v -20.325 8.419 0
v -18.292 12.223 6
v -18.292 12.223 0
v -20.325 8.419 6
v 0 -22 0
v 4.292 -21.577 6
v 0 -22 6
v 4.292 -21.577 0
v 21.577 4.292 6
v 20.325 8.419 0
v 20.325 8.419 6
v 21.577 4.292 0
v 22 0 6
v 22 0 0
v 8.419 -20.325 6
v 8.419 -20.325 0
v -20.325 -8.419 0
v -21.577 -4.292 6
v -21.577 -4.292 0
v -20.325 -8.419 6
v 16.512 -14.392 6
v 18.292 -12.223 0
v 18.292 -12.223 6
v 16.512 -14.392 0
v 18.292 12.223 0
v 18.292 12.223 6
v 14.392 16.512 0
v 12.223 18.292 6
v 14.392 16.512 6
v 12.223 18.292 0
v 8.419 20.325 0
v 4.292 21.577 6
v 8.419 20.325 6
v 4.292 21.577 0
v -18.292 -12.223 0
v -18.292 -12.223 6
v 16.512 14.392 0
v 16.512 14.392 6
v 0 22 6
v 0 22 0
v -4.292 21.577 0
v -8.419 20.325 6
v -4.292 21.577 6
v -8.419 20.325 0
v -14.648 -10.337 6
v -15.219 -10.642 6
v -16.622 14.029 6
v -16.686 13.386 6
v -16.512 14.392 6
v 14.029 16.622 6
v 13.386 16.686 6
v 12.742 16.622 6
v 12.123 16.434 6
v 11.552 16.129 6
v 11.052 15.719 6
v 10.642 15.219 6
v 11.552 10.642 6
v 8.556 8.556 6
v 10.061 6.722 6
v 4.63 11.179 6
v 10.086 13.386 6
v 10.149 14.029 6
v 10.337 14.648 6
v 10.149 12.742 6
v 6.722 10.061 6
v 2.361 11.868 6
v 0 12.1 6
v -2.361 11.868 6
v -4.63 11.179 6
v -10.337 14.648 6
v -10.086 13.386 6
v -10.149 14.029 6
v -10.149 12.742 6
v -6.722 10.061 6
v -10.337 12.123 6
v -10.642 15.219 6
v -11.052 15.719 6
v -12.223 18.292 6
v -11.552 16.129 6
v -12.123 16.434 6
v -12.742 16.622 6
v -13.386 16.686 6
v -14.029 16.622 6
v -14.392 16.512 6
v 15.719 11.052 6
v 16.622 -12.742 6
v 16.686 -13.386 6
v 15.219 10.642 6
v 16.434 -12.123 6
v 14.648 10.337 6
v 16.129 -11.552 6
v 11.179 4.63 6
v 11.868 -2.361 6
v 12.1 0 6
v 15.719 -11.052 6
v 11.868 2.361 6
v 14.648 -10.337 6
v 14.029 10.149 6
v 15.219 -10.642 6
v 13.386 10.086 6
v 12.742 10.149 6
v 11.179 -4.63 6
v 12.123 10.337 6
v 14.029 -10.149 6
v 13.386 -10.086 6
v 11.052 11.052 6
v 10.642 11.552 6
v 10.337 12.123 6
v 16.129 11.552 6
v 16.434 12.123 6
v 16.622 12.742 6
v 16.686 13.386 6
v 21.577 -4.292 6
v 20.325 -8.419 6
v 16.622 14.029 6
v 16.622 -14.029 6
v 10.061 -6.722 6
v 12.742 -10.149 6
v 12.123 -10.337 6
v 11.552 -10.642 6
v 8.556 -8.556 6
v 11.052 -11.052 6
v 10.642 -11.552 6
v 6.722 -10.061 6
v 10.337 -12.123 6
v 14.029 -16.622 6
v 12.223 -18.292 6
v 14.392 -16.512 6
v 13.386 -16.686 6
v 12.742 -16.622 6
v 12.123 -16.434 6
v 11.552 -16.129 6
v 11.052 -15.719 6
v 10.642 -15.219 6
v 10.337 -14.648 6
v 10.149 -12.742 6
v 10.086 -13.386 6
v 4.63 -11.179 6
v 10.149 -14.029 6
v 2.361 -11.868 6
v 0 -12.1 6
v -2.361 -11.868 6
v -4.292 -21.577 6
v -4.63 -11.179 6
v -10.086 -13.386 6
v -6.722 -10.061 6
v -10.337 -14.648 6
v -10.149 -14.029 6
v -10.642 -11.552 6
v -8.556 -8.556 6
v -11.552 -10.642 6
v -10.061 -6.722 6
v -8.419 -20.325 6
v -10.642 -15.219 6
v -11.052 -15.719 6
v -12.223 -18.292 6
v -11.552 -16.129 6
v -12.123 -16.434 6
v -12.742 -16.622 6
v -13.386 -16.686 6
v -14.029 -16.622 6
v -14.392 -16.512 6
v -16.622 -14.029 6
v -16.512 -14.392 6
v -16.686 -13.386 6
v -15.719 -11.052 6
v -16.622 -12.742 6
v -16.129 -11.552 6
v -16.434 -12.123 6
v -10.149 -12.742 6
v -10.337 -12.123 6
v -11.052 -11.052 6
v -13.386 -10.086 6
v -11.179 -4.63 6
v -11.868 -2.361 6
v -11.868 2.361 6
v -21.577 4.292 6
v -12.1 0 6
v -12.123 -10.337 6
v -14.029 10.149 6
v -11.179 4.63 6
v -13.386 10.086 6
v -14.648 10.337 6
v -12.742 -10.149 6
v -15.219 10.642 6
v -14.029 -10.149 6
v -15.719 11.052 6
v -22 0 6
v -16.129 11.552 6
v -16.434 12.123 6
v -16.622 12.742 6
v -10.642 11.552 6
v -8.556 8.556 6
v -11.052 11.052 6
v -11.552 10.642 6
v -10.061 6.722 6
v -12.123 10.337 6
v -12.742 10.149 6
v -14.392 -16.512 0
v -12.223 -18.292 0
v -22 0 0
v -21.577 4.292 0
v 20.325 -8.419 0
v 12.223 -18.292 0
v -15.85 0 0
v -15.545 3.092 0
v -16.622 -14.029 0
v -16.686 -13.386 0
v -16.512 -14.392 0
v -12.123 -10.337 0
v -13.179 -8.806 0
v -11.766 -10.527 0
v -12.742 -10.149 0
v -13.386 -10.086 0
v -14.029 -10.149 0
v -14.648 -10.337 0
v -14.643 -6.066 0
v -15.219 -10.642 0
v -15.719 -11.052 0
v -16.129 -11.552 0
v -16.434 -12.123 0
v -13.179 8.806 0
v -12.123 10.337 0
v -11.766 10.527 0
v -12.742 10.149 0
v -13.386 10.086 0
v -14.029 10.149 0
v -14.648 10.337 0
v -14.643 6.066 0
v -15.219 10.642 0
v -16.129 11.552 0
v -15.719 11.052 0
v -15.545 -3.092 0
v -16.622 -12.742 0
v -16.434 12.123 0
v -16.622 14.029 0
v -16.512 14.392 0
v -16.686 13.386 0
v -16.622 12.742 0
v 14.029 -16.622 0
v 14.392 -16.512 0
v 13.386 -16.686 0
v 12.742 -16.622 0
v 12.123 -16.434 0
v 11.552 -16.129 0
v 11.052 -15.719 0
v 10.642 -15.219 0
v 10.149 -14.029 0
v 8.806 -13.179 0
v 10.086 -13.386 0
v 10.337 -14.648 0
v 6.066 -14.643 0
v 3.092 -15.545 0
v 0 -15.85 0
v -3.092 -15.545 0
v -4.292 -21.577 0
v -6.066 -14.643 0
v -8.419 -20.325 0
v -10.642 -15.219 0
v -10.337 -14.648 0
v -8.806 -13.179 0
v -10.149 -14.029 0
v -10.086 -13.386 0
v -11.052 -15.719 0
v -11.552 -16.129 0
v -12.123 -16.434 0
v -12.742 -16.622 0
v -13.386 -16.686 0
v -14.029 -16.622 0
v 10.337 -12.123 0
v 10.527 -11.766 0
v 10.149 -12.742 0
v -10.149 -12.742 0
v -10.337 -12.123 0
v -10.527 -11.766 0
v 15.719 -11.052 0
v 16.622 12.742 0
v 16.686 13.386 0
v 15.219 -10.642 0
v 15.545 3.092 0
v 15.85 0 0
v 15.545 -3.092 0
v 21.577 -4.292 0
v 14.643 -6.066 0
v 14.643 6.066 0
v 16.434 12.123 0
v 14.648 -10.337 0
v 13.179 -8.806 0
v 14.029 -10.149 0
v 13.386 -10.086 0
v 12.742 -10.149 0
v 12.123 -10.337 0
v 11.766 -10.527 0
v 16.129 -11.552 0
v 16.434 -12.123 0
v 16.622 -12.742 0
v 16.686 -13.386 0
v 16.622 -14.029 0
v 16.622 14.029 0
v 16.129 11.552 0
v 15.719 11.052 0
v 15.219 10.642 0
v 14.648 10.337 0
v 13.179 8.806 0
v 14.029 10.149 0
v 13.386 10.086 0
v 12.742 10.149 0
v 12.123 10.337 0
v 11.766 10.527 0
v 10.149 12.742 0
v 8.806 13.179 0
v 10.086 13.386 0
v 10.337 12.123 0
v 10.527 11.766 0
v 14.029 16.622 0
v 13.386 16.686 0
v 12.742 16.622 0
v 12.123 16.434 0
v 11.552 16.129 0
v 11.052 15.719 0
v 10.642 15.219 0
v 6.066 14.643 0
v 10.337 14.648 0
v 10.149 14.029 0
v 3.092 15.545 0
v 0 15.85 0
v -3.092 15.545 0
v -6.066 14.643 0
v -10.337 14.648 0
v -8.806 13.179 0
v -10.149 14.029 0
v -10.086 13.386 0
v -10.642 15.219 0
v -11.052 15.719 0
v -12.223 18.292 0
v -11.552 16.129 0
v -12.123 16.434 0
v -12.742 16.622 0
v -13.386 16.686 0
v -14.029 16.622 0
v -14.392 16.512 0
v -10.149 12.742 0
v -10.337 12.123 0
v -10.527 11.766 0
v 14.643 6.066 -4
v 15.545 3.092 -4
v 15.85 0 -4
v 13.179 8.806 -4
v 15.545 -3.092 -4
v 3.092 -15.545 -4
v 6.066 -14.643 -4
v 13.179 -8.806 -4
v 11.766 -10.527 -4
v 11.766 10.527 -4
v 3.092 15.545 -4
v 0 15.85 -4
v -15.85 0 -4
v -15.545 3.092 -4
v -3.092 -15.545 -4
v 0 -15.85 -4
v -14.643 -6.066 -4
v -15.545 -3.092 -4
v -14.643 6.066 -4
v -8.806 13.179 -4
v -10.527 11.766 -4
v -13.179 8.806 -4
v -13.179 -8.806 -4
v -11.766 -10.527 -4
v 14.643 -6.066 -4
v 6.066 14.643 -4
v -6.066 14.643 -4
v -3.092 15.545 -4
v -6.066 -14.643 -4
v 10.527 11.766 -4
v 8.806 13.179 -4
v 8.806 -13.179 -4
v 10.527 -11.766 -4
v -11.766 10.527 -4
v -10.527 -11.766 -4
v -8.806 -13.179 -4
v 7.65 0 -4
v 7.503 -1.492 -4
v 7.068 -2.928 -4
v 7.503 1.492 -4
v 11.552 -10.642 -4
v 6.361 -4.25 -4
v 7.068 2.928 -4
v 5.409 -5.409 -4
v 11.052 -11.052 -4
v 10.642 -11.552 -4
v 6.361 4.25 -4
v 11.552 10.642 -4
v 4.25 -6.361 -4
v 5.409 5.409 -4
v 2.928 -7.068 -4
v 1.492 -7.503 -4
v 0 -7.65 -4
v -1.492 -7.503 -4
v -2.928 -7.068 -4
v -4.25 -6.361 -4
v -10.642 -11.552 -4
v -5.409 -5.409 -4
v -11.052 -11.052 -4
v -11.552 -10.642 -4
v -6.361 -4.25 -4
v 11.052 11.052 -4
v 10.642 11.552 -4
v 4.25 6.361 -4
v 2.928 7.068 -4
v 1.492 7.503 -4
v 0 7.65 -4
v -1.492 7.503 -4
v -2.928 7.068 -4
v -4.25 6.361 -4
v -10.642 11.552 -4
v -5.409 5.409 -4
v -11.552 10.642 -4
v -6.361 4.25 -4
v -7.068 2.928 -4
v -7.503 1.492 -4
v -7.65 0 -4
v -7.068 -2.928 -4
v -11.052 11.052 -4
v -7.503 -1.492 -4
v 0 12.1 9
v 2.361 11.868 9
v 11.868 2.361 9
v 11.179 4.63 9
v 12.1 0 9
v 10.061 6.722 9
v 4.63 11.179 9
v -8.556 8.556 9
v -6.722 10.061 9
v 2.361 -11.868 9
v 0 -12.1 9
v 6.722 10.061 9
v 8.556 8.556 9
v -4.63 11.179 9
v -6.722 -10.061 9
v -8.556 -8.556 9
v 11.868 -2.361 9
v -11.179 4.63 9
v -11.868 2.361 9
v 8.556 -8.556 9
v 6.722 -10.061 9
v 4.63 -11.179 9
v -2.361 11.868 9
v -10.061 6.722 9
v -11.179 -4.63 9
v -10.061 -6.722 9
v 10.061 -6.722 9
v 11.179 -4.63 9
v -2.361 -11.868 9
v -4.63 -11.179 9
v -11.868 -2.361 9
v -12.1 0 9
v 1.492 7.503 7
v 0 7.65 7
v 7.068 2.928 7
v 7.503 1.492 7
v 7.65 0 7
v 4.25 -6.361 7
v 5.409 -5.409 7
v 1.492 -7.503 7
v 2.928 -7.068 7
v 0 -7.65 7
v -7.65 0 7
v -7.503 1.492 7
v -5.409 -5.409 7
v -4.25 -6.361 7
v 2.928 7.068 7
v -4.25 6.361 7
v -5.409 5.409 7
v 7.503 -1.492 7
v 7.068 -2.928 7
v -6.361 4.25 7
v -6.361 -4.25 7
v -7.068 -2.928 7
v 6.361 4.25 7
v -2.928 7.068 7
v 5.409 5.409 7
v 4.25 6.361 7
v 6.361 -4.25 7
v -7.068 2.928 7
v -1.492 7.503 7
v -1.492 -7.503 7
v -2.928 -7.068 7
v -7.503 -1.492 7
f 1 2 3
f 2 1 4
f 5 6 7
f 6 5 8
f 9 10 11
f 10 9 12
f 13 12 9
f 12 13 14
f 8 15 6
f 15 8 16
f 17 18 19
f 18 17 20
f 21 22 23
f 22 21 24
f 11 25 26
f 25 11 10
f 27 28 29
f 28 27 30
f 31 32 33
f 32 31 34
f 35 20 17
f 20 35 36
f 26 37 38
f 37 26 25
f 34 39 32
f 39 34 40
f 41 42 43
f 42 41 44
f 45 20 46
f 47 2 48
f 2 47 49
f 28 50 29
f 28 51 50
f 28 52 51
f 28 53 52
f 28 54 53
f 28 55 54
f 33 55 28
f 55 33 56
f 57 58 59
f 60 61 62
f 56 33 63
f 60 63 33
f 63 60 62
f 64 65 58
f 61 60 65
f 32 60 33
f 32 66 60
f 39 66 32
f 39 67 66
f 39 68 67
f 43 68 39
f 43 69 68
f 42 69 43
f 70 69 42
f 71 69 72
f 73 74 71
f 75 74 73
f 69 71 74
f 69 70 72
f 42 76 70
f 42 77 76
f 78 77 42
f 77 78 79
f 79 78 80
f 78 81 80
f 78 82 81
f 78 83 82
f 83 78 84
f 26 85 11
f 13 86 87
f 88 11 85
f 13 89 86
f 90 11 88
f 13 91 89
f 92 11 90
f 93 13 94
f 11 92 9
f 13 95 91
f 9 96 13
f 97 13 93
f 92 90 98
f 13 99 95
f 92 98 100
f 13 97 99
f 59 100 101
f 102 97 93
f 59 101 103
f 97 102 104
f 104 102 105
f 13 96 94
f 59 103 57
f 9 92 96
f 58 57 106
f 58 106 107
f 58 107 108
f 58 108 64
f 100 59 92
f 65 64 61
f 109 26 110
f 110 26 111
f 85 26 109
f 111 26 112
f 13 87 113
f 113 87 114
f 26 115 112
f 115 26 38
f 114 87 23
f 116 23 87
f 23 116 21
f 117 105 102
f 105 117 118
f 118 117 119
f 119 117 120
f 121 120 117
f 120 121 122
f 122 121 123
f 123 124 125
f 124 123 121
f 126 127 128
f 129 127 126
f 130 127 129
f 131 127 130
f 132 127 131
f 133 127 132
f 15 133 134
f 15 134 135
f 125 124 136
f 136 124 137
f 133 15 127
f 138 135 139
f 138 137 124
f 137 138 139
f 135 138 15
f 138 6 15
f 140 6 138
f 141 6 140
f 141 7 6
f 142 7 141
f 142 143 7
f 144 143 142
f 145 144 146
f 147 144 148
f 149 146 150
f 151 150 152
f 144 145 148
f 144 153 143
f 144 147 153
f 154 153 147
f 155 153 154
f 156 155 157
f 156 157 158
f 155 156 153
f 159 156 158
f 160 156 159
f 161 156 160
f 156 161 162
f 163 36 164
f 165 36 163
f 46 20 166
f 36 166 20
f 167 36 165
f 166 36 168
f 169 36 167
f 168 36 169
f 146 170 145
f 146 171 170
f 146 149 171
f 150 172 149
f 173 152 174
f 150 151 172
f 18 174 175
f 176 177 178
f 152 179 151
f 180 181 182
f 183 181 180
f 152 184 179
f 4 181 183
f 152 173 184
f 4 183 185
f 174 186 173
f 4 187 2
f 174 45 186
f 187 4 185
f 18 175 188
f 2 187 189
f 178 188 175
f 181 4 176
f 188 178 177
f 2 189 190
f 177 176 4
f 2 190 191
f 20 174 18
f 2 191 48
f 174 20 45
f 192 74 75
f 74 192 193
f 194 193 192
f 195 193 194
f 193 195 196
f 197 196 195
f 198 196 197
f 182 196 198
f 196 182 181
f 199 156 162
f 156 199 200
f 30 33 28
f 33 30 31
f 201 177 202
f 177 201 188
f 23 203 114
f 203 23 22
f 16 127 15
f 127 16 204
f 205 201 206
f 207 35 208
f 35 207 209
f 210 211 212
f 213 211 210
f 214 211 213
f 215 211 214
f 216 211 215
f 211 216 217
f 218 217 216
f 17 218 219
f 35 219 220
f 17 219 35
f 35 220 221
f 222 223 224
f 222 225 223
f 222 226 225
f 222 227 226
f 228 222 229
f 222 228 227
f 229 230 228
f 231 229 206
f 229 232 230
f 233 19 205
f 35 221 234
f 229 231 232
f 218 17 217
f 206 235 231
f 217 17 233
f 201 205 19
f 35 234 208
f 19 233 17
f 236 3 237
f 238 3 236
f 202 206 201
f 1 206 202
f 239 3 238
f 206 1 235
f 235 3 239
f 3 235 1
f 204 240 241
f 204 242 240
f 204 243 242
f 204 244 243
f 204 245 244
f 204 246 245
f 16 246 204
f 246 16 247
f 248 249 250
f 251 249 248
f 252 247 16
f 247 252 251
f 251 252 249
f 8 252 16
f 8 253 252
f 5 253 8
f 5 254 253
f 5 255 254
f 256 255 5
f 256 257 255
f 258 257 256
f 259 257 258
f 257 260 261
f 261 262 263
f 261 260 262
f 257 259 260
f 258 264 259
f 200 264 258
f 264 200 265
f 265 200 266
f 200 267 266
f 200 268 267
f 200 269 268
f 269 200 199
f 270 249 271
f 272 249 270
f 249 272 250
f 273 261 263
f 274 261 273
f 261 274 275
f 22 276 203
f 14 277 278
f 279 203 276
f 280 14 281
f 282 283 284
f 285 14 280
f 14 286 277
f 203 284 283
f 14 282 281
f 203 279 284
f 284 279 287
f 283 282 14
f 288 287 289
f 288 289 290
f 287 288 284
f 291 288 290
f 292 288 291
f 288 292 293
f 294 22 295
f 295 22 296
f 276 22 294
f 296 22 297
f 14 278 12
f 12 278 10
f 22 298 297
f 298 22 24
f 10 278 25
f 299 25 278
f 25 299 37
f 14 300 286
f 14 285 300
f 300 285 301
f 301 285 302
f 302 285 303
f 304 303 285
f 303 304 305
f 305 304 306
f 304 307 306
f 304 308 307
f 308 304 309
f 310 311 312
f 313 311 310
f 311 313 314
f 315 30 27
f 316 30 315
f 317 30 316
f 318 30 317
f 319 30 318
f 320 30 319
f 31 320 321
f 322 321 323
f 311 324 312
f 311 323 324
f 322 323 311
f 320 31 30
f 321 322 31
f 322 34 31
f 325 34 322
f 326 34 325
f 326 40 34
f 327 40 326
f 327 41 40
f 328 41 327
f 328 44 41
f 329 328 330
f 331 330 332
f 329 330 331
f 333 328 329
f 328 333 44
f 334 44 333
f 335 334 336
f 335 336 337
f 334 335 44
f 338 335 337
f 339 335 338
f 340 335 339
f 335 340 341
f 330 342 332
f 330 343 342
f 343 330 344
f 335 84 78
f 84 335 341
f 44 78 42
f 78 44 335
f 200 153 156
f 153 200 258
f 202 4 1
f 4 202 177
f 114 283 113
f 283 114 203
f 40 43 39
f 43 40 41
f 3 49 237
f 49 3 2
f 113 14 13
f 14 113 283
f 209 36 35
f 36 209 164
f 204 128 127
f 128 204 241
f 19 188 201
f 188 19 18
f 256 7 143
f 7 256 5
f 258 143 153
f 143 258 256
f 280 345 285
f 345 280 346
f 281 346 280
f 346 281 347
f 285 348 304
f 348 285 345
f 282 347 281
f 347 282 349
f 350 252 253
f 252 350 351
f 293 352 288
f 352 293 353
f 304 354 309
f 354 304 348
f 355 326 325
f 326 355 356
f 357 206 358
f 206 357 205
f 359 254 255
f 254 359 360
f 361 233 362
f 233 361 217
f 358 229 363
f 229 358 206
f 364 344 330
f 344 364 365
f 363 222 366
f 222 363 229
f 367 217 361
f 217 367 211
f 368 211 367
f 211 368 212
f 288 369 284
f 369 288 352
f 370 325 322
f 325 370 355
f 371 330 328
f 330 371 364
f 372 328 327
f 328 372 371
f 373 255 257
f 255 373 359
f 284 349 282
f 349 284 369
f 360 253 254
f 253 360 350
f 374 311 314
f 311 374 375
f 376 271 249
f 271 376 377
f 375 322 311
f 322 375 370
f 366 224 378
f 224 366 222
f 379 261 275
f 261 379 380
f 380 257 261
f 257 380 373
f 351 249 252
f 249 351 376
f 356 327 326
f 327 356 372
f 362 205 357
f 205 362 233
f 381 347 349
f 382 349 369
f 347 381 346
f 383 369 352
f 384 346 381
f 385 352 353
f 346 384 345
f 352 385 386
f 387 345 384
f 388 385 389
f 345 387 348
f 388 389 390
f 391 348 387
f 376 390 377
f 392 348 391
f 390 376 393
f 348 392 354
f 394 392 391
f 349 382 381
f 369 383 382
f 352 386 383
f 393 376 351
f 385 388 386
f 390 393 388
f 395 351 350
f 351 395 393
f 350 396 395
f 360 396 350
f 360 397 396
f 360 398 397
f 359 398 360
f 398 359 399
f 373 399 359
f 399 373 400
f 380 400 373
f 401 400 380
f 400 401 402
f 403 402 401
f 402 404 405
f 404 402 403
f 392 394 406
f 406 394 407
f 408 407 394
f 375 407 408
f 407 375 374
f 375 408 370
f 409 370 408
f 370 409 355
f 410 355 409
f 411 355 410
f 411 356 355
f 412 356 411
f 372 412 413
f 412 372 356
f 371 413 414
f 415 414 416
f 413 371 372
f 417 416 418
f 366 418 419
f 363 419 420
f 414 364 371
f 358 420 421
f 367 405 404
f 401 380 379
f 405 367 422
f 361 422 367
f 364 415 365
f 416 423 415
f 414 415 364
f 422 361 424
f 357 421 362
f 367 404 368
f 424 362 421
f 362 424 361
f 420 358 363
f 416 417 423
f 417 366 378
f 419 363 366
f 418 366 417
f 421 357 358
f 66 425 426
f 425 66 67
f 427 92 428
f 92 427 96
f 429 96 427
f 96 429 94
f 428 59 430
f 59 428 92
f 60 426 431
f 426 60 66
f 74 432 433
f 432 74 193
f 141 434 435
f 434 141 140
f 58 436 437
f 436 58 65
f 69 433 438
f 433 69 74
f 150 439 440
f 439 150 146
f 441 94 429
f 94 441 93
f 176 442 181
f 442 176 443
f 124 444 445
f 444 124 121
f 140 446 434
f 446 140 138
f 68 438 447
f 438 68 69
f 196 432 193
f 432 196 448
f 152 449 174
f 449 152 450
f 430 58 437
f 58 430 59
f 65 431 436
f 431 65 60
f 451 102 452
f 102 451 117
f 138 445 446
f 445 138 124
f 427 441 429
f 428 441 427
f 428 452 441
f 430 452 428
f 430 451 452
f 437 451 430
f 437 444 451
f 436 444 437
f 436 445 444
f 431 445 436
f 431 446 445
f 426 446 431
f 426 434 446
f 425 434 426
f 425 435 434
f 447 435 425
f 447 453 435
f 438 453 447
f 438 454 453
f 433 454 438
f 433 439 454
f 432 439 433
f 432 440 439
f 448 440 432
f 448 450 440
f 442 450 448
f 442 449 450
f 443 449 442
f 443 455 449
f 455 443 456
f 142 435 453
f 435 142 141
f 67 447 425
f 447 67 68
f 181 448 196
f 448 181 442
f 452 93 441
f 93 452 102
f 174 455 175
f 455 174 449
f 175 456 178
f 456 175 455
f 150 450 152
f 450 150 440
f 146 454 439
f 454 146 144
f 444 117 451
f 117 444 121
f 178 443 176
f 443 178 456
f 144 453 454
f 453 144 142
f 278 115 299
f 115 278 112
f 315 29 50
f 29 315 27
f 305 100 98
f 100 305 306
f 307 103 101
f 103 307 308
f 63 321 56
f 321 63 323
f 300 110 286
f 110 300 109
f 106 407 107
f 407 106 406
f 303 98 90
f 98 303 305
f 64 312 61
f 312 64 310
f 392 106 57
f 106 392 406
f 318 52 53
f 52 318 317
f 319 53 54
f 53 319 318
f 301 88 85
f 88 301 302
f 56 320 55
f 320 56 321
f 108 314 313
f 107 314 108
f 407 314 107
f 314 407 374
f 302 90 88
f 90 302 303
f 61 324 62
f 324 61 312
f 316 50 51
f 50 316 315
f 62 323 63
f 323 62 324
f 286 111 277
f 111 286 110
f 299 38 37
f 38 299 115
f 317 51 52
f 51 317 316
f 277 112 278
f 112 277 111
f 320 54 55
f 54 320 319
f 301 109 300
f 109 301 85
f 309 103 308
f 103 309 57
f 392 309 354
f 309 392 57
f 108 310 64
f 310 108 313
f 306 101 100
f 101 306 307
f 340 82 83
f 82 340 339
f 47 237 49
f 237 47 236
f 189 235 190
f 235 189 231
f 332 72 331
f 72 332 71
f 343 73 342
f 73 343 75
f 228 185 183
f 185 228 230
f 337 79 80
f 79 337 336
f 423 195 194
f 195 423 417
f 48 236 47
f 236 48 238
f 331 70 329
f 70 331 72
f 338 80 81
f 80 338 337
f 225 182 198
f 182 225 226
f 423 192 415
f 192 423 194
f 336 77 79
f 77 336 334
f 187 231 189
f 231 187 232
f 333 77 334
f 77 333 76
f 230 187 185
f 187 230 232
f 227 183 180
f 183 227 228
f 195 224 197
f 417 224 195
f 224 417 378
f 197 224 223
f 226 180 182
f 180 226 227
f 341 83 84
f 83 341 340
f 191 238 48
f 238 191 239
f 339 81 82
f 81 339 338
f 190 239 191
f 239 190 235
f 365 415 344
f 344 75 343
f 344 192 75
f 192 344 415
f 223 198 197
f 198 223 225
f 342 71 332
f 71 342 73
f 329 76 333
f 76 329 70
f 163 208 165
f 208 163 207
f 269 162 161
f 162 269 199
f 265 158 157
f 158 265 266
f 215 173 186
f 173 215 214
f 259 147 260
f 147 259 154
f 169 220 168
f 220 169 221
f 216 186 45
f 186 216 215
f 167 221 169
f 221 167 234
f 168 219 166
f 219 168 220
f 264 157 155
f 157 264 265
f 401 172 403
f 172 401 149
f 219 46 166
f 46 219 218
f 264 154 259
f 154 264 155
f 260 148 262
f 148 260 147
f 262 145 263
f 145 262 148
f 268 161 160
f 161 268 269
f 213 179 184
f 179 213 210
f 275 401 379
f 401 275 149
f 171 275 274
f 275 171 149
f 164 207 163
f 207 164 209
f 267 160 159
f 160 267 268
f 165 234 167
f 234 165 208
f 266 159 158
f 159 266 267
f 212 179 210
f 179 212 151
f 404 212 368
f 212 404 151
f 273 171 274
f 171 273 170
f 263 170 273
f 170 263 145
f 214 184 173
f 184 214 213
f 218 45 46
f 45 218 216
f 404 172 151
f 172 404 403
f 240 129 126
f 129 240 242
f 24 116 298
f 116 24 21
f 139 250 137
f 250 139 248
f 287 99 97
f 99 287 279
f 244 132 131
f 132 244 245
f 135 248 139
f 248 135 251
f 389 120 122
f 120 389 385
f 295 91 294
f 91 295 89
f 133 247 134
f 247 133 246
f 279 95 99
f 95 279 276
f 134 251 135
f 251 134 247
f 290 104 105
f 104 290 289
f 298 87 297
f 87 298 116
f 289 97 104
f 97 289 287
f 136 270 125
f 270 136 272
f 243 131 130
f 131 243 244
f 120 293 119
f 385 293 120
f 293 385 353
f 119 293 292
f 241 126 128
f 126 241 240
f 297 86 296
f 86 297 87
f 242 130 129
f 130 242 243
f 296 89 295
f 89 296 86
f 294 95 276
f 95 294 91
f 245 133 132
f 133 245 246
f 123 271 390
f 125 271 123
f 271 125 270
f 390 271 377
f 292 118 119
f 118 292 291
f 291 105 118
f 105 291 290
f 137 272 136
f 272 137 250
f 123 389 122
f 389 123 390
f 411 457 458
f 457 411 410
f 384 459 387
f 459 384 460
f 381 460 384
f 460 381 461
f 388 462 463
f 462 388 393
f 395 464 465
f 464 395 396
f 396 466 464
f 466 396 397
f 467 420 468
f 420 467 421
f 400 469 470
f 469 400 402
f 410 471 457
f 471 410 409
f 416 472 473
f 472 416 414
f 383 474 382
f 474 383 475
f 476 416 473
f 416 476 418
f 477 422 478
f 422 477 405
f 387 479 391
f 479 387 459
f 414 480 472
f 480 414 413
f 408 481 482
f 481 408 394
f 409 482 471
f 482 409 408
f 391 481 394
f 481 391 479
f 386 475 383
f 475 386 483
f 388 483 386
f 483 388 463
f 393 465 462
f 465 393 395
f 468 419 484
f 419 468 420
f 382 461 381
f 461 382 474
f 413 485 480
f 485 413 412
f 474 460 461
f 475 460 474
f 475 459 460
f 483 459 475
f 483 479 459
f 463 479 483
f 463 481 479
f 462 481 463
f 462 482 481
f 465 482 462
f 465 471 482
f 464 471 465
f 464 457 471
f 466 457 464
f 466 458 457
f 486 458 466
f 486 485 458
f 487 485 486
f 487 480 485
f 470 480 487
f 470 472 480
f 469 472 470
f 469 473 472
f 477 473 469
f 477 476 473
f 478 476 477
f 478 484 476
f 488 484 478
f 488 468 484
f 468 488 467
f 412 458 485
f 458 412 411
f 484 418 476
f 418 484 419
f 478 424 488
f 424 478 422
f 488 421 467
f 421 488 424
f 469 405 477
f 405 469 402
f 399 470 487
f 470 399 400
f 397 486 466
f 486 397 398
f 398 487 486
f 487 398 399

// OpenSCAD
$fn = 32;

// ----------------------------------------------------------------------
// Retaining cap: 6002 cover, 44 mm, spigot 31.7 mm
// ----------------------------------------------------------------------

// --- parameters (mm) ---
cover_d = 44;             // cover diameter
cover_t = 6;              // cover thickness
spigot_d = 31.7;          // spigot that enters the housing
spigot_h = 4;             // spigot height
shaft_d = 15.3;           // shaft opening
bolt_d = 6.6;             // bolt clearance
bolt_r = 18.93;           // bolt circle radius
dome_h = 3;               // raised centre

module cover() {
  cylinder(h = cover_t, d = cover_d);
}

module spigot() {
  /* sunk 1 mm into the cover; the spigot sets the overall height */
  translate([0, 0, -spigot_h]) cylinder(h = spigot_h + 1, d = spigot_d);
}

module dome() {
  translate([0, 0, cover_t - 1]) cylinder(h = dome_h + 1, d = cover_d * 0.55);
}

difference() {
  union() {
    cover();
    spigot();
    dome();
  }
  for (i = [0 : 3]) rotate([0, 0, 45 + i * 90]) translate([bolt_r, 0, -spigot_h - 1])
    cylinder(h = spigot_h + cover_t + 2, d = bolt_d);
  translate([0, 0, -spigot_h - 1]) cylinder(h = spigot_h + cover_t + 2, d = shaft_d);
}
